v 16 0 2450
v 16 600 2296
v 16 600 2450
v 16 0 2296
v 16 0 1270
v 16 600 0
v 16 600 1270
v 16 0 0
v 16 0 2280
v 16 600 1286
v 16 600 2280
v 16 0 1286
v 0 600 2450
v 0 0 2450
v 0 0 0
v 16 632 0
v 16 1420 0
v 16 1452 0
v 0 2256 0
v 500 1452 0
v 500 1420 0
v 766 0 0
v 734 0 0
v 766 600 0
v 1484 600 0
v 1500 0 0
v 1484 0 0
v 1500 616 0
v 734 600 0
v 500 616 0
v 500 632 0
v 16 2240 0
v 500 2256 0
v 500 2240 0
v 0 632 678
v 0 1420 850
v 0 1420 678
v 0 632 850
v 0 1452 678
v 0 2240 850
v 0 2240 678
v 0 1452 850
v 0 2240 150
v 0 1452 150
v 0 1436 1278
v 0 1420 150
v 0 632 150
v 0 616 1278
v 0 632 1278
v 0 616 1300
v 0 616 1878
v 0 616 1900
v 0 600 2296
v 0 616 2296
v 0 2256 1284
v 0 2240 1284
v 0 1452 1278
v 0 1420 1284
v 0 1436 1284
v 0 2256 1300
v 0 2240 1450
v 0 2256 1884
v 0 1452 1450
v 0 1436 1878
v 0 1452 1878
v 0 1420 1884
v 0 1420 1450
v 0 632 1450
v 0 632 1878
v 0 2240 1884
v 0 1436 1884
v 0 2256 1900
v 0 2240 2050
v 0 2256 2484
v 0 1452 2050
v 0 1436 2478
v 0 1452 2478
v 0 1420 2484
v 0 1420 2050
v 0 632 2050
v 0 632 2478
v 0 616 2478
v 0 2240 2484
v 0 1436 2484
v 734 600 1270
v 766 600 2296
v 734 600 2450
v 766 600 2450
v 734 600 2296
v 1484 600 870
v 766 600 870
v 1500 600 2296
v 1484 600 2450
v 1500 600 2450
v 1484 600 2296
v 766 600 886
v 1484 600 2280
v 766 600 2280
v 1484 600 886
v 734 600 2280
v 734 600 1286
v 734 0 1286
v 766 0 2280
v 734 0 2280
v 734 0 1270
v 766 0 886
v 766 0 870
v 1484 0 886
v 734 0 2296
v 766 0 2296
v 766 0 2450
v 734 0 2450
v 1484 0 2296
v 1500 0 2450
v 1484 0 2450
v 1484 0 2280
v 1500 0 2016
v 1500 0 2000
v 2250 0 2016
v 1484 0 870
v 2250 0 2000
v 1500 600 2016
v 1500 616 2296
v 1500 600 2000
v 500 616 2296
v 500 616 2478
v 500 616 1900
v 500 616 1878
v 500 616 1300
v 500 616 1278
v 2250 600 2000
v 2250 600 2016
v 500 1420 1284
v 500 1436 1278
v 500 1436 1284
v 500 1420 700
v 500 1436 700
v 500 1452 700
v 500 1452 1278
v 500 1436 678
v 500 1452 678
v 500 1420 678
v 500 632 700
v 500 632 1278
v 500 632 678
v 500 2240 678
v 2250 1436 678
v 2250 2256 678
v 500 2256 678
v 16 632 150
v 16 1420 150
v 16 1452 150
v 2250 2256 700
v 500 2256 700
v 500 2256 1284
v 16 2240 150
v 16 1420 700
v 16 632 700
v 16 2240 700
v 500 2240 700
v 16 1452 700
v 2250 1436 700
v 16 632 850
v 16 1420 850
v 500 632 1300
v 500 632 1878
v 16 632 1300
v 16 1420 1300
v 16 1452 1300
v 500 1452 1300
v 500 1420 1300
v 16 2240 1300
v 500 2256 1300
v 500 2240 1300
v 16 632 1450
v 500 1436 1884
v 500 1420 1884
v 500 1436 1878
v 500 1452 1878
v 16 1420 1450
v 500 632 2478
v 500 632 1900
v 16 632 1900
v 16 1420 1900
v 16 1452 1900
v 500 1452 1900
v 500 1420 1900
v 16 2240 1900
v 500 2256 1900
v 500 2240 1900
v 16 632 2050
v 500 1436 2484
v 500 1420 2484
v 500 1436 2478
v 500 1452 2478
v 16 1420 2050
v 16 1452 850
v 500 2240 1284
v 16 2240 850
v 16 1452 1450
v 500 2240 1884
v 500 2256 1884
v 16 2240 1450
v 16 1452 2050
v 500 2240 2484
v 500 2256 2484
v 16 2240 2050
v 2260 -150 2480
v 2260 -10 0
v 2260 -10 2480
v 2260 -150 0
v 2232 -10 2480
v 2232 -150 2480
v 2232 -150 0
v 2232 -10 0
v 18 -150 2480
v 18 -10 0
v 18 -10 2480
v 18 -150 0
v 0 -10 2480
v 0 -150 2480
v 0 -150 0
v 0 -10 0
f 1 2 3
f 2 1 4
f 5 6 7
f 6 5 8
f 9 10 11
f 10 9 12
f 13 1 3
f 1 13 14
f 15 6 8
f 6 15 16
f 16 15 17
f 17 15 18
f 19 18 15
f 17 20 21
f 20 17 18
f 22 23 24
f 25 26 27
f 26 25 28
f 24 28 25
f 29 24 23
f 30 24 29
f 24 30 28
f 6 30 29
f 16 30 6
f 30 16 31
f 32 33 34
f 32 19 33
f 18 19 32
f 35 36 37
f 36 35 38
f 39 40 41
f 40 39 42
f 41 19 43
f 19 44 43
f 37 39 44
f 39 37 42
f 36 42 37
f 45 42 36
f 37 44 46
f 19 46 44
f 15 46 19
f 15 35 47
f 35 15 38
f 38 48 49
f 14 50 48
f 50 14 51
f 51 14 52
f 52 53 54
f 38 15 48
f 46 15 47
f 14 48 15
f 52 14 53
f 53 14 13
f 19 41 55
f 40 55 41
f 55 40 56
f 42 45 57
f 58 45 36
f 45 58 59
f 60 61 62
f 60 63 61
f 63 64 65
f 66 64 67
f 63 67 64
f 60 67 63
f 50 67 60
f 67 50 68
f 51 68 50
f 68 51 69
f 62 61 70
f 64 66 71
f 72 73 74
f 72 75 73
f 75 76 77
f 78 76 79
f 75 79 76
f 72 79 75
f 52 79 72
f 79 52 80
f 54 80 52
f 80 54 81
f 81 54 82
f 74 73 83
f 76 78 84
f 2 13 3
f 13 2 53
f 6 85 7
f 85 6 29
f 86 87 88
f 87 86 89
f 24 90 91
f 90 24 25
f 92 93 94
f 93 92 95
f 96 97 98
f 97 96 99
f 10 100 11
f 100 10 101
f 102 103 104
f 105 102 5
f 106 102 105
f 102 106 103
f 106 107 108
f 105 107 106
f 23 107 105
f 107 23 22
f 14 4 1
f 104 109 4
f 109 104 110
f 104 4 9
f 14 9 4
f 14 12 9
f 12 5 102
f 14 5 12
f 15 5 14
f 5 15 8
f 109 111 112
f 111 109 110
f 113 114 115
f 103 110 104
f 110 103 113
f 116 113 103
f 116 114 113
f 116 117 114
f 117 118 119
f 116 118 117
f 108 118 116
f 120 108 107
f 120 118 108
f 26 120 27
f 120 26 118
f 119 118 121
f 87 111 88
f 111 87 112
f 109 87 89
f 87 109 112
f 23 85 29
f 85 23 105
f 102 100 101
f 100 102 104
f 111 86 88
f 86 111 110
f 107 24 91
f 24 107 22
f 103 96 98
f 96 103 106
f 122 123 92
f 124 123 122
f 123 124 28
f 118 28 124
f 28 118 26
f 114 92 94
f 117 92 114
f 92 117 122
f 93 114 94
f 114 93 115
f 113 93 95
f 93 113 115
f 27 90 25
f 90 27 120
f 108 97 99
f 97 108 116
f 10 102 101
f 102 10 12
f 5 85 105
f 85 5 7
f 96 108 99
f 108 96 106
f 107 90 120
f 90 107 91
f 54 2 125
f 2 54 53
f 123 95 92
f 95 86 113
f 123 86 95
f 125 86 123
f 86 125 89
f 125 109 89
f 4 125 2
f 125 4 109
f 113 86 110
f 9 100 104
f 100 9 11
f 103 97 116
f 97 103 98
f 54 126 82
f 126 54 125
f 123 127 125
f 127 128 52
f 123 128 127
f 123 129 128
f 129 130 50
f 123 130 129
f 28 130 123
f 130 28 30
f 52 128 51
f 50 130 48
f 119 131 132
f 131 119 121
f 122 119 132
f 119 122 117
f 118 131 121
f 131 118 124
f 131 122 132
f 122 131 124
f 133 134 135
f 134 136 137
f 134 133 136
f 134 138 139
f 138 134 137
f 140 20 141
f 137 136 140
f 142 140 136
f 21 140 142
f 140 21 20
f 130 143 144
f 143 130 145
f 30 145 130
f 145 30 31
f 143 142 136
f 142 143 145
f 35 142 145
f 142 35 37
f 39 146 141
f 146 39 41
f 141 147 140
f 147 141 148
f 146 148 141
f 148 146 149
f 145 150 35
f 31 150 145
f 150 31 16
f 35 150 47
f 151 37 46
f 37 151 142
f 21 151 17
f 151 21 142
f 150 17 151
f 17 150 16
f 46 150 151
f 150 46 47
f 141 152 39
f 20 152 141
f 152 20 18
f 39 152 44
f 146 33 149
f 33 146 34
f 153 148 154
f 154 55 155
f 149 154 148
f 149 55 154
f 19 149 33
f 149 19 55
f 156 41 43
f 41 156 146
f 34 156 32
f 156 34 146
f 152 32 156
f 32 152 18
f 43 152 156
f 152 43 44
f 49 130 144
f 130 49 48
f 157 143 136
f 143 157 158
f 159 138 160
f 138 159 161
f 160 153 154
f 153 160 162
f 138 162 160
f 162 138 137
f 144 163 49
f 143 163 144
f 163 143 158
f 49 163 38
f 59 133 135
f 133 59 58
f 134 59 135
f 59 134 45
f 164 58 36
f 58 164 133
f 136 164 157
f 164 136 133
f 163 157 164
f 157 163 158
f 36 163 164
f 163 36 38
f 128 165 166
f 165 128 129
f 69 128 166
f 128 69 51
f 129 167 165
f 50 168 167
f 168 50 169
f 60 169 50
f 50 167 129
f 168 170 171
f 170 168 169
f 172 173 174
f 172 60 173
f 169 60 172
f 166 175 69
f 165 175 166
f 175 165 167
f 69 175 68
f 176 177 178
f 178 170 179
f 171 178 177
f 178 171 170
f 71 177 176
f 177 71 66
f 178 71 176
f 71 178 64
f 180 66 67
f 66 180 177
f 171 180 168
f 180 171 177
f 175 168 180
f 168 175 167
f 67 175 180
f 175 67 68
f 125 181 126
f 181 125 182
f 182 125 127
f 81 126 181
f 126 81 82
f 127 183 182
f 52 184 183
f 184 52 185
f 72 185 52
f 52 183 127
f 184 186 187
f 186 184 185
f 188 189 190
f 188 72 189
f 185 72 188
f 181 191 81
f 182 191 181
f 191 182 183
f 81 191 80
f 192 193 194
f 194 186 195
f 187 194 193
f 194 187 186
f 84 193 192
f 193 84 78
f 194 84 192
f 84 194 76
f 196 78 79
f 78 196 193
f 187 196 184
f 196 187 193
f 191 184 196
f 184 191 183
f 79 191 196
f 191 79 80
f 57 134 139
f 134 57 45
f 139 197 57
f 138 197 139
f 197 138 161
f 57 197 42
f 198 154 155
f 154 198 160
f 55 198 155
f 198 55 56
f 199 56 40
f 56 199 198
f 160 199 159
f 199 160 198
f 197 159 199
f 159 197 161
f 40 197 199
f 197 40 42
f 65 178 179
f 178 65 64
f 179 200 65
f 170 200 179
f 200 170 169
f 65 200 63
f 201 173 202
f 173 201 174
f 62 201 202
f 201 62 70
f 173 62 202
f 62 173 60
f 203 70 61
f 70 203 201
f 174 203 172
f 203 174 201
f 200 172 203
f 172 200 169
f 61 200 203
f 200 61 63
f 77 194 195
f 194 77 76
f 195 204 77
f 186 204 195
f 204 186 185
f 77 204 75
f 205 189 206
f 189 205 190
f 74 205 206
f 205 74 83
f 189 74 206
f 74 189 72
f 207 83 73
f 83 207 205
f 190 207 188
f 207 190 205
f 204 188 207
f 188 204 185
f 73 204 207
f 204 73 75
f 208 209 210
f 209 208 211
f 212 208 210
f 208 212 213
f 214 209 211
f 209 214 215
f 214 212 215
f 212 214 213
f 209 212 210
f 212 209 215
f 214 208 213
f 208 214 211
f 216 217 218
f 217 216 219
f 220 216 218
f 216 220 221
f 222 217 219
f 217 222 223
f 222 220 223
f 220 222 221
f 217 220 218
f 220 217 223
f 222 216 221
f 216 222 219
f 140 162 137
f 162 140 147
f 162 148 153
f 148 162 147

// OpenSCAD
W=2250;
L=2380;

w=750;
l=600;
H=2450;

RH=2480;

wall=16;



//%translate([w*0.5,l/2, H-500])     cube([w-80, l-40, 1000], center=true);
//%translate([w*0.5,l/2, H300]) rotate([0,90,0]) cylinder(h=w-80, r=800, center=true);


//%translate([w*0.5,l/2, RH-800-200]) rotate([0,90,0])     cylinder(h=w+80, r=800, center=true);



//%translate([w*1.5,l/2, H-500-200]) cube([w-80, l-40, 1400], center=true);
translate([0,0,0]) wardrobe();

%translate([0,-10,0]) rails();
//translate([0,-10,0]) doors();

//floor
%translate([0,-150,-10]) cube([W,L,10]);
//%translate([W,-150-700*2,0]) cube([10,700,2000]);
module wardrobe(){
    for (x=[0, w-wall, w, 2*w-wall]) translate([x,0,0]) cube([wall, l, H]);
    
    %for (i=[0:6]) translate([w*0.5,l*0.5, i*175+40]) box();
    %for (i=[0:3]) translate([w*1.5,l*0.5, i*175+40]) box();
        
    // polki
    translate([0,0,H-1180]) cube([w,l,wall]);
    translate([w,0,H-1180-400]) cube([w,l,wall]);
    // antresol
    translate([0,0,RH-200]) cube([w,l,wall]);
    translate([w,0,RH-200]) cube([w,l,wall]);
    
    // back walls
    translate([0,600,0]) cube([750,wall,RH-200+wall]);
    translate([750,600,0]) cube([750,wall,RH-200+wall]);
    echo(RH-200+wall);
    //polka nad dveriu
    translate([w*2,0,2000]) cube([w,l,wall]);
    

}

translate([W-18,-150,0]) cube([28,140,RH]); //косяк
translate([0,-150,0]) cube([18,140,RH]); //косяк

//
module rails(){
    translate([0,-45-16,RH-200]) cube([W, 45, 200]);
    for(i=[1:3]) translate([0,-35*i,2480-200-35]) 
        color([0.5,0.5,0.5])cube([W, 34, 35]);
}

module doors(){
    dh=RH-200-100;
    dw=w+36;
    for(i=[1:3]) translate([18+(3-i)*w-wall*(4-i),-35*i,20]) 
        color([0.3,0.5,0.5, 0.5])cube([750, 16, dh]);   
}

module box(){
    $fn=12;
    bw=685;
    bl=535;
    hull(){
        for (i=[-1,1]) for (j=[-1,1]){
            translate([(bw/2-30)*i, (bl/2-30)*j,0]) cylinder(h=10, r=10);
            translate([bw/2*i, bl/2*j,150]) cylinder(h=10, r=10);
        }
    }
}

module fx_box(){
       $fn=12;
    bw=490;
    bl=370;
    %color([1,0.8,0.6, 0.5]) hull(){
        for (i=[-1,1]) for (j=[-1,1]){
            translate([(bw/2-30)*i, (bl/2-30)*j,0]) cylinder(h=10, r=10);
            translate([bw/2*i, bl/2*j,270])  cylinder(h=10, r=10);
        }
    } 
}

sw=820/2;
for(i=[0:3]) for(j=[0:1]) translate([500/2, l+wall+sw*(1/2+i), j*270]) fx_box();
for(i=[0:3]) for(j=[0:1]) translate([500/2, l+wall+sw*(1/2+i), j*270+700]) fx_box();
for(i=[0:3]) for(j=[0:1]) translate([500/2, l+wall+sw*(1/2+i), j*270+700+600]) fx_box();   
for(i=[0:3]) for(j=[0:1]) translate([500/2, l+wall+sw*(1/2+i), j*270+700+600*2]) fx_box();     
    
for(i=[0:1]) translate([0, l+wall+sw*(i)*2, 0]) color([0.5+0.5*i,1,1]) {
    cube([500,wall,700-22]);
    translate([0,sw*2-wall,0]) cube([500,wall,700-22]);
    translate([0,wall,0]) cube([wall,sw*2-wall,150]);
}
    
for(i=[0:1]) for(j=[0:2])translate([0, l+wall+sw*(i)*2, 700+j*600]) color([0.5+0.5*i,1,1]) {
    cube([500,wall,600-22]);
    translate([0,sw*2-wall,0]) cube([500,wall,600-wall]);
    translate([0,wall,0]) cube([wall,sw*2-wall,150]);
}

{   // tables
translate([0,l+wall,700-22]) cube([500,820,22]);   
translate([0,l+wall+820,700-22]) cube([W,820,22]);
}



for(i=[3]) for(j=[0:1]) translate([W-500/2, l+sw*(1/2+i), j*270]) fx_box();
